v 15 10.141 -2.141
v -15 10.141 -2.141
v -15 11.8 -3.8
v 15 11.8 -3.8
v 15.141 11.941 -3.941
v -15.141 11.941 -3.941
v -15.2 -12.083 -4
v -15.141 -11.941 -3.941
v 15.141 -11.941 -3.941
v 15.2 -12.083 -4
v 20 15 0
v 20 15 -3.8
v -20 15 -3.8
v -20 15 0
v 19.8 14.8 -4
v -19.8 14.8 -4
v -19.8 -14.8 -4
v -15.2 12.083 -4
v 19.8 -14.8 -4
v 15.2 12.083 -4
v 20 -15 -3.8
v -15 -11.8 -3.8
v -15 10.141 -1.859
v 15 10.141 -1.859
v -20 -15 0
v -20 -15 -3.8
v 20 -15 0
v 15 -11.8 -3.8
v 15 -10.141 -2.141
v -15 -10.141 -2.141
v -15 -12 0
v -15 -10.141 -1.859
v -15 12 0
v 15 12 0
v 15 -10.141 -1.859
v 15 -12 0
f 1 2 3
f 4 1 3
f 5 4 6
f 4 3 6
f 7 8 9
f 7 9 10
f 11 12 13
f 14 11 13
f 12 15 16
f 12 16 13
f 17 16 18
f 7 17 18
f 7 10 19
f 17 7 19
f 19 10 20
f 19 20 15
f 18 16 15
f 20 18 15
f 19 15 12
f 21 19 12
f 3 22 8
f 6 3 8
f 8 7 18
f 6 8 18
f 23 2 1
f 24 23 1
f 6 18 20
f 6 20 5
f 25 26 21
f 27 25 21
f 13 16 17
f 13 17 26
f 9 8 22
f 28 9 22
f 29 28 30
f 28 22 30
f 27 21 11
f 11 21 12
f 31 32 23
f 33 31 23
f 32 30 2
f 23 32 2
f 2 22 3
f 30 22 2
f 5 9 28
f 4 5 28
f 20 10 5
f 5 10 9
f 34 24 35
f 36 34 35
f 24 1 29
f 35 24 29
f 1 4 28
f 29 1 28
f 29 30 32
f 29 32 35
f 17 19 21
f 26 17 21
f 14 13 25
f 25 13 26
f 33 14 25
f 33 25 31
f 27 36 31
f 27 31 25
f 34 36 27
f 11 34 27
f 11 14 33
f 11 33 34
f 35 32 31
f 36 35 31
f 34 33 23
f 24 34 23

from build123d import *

# Parameters (mm, degrees)
F0_W         = 40
F0_H         = 30
F0_W_2       = 30
F0_H_2       = 24
F4_DEPTH     = 30
F5_SIZE      = 0.2
F6_T1_DEPTH  = 31.0286731952
F6_T3_DEPTH  = 41.0286731952
F6_T5_DEPTH  = 30
F6_T10_DEPTH = 25.0286731952
F6_T16_DEPTH = 25.0286731952
F6_T23_DEPTH = 25.0286731952
F6_T27_DEPTH = 30.225714172
F6_T34_DEPTH = 25.0286731952
F6_T38_DEPTH = 30.225714172
F6_T45_DEPTH = 30.225714172
F6_T49_DEPTH = 25.0286731952
F6_T56_DEPTH = 25.0286731952
F6_T60_DEPTH = 30.225714172


# Not quite as in the source:
# - a fillet or chamfer that OpenCascade refuses, or shapes differently, is made with other operations: its cross-section is extruded or revolved along the edge and cut away or added


with BuildPart() as f2:
    # F2: sweep along a path in F1
    with BuildLine(Plane.XZ) as f2_path:
        Line((0, 0), (0, -4))
    # F0 (on Top) → F2 (sweep)
    with BuildSketch(Plane.XY):
        Rectangle(F0_W, F0_H)
        Rectangle(F0_W_2, F0_H_2, mode=Mode.SUBTRACT)
    sweep(path=f2_path.line)

    # F3 (on face) → F4 (join, through all)
    with BuildSketch(Plane.YZ.offset(-15)):
        Polygon((-10, -2), (-12, 0), (-12, -4), align=None)
        Polygon((10, -2), (12, -4), (12, 0), align=None)
    extrude(amount=F4_DEPTH)

    # F5
    f5_edges = [f2.edges().sort_by_distance(p)[0] for p in [
        (0, -10, -2),
        (0, 10, -2),
    ]]
    chamfer(f5_edges, length=F5_SIZE)

    # F6: chamfer of 0.2 on 8 edges, made by hand

    # F6_s2 → F6_t1 (cut)
    with BuildSketch(Plane.XZ.offset(-15.5143365976)):
        Polygon((19.8, -4), (20, -3.8), (20, -4), align=None)
        Polygon((-19.8, -4), (-20, -3.8), (-20, -4), align=None)
    extrude(amount=F6_T1_DEPTH, mode=Mode.SUBTRACT)

    # F6_s4 → F6_t3 (cut)
    with BuildSketch(Plane.YZ.offset(-20.5143365976)):
        Polygon((-14.8, -4), (-15, -3.8), (-15, -4), align=None)
        Polygon((14.8, -4), (15, -3.8), (15, -4), align=None)
    extrude(amount=F6_T3_DEPTH, mode=Mode.SUBTRACT)

    # F6_s6 → F6_t5 (cut)
    with BuildSketch(Plane.YZ.offset(-15)):
        Polygon((-11.9414213562, -3.9414213562), (-12.0828427125, -4), (-12, -4), align=None)
        Polygon((12.0828427125, -4), (11.9414213562, -3.9414213562), (12, -4), align=None)
    extrude(amount=F6_T5_DEPTH, mode=Mode.SUBTRACT)


with BuildPart() as f6_tool8:
    # F6_s9 → F6_t10 (new body)
    with BuildSketch(Plane.XZ.offset(12.5143365976)):
        Polygon((-15, -3.8), (-15.2, -4), (-15, -4), align=None)
    extrude(amount=-F6_T10_DEPTH)

    split(bisect_by=Plane(origin=(0, -4, 4), x_dir=(1, 0, 0), z_dir=(0, 0.7071067812, -0.7071067812)), keep=Keep.TOP)

    split(bisect_by=Plane(origin=(0, 4, 4), x_dir=(1, 0, 0), z_dir=(0, -0.7071067812, -0.7071067812)), keep=Keep.TOP)


with BuildPart() as f2_1:
    add(f2.part)

    # F6_t7: cut F6_tool8
    add(f6_tool8.part, mode=Mode.SUBTRACT)


with BuildPart() as f6_tool14:
    # F6_s15 → F6_t16 (new body)
    with BuildSketch(Plane.XZ.offset(-12.5143365976)):
        Polygon((15.2, -4), (15, -3.8), (15, -4), align=None)
    extrude(amount=F6_T16_DEPTH)

    split(bisect_by=Plane(origin=(0, -4, 4), x_dir=(1, 0, 0), z_dir=(0, 0.7071067812, -0.7071067812)), keep=Keep.TOP)

    split(bisect_by=Plane(origin=(0, 4, 4), x_dir=(1, 0, 0), z_dir=(0, -0.7071067812, -0.7071067812)), keep=Keep.TOP)


with BuildPart() as f2_2:
    add(f2_1.part)

    # F6_t13: cut F6_tool14
    add(f6_tool14.part, mode=Mode.SUBTRACT)


with BuildPart() as f6_tool21:
    # F6_s22 → F6_t23 (new body)
    with BuildSketch(Plane.XZ.offset(12.5143365976)):
        Polygon((-15, -3.8), (-15.2, -4), (-15, -4), align=None)
    extrude(amount=-F6_T23_DEPTH)

    split(bisect_by=Plane(origin=(0, -4, 4), x_dir=(1, 0, 0), z_dir=(0, -0.7071067812, 0.7071067812)), keep=Keep.TOP)


with BuildPart() as f6_tool25:
    # F6_s26 → F6_t27 (new body)
    with BuildSketch(Plane.YZ.offset(15)):
        Polygon((-11.9414213562, -3.9414213562), (-12.0828427125, -4), (-12, -4), align=None)
    extrude(amount=-F6_T27_DEPTH)

    split(bisect_by=Plane.YZ.offset(-15), keep=Keep.BOTTOM)


with BuildPart() as f6_tool21_1:
    add(f6_tool21.part)

    # F6_t29: intersect F6_tool25
    add(f6_tool25.part, mode=Mode.INTERSECT)


with BuildPart() as f2_3:
    add(f2_2.part)

    # F6_t19: cut F6_tool21
    add(f6_tool21_1.part, mode=Mode.SUBTRACT)


with BuildPart() as f6_tool32:
    # F6_s33 → F6_t34 (new body)
    with BuildSketch(Plane.XZ.offset(12.5143365976)):
        Polygon((-15, -3.8), (-15.2, -4), (-15, -4), align=None)
    extrude(amount=-F6_T34_DEPTH)

    split(bisect_by=Plane(origin=(0, 4, 4), x_dir=(1, 0, 0), z_dir=(0, 0.7071067812, 0.7071067812)), keep=Keep.TOP)


with BuildPart() as f6_tool36:
    # F6_s37 → F6_t38 (new body)
    with BuildSketch(Plane.YZ.offset(-15.225714172)):
        Polygon((12.0828427125, -4), (11.9414213562, -3.9414213562), (12, -4), align=None)
    extrude(amount=F6_T38_DEPTH)

    split(bisect_by=Plane.YZ.offset(-15), keep=Keep.BOTTOM)


with BuildPart() as f6_tool32_1:
    add(f6_tool32.part)

    # F6_t40: intersect F6_tool36
    add(f6_tool36.part, mode=Mode.INTERSECT)


with BuildPart() as f2_4:
    add(f2_3.part)

    # F6_t30: cut F6_tool32
    add(f6_tool32_1.part, mode=Mode.SUBTRACT)


with BuildPart() as f6_tool43:
    # F6_s44 → F6_t45 (new body)
    with BuildSketch(Plane.YZ.offset(15.225714172)):
        Polygon((-11.9414213562, -3.9414213562), (-12.0828427125, -4), (-12, -4), align=None)
    extrude(amount=-F6_T45_DEPTH)

    split(bisect_by=Plane.YZ.offset(15), keep=Keep.TOP)


with BuildPart() as f6_tool47:
    # F6_s48 → F6_t49 (new body)
    with BuildSketch(Plane.XZ.offset(-12.5143365976)):
        Polygon((15.2, -4), (15, -3.8), (15, -4), align=None)
    extrude(amount=F6_T49_DEPTH)

    split(bisect_by=Plane(origin=(0, -4, 4), x_dir=(1, 0, 0), z_dir=(0, -0.7071067812, 0.7071067812)), keep=Keep.TOP)


with BuildPart() as f6_tool43_1:
    add(f6_tool43.part)

    # F6_t51: intersect F6_tool47
    add(f6_tool47.part, mode=Mode.INTERSECT)


with BuildPart() as f2_5:
    add(f2_4.part)

    # F6_t41: cut F6_tool43
    add(f6_tool43_1.part, mode=Mode.SUBTRACT)


with BuildPart() as f6_tool54:
    # F6_s55 → F6_t56 (new body)
    with BuildSketch(Plane.XZ.offset(-12.5143365976)):
        Polygon((15.2, -4), (15, -3.8), (15, -4), align=None)
    extrude(amount=F6_T56_DEPTH)

    split(bisect_by=Plane(origin=(0, 4, 4), x_dir=(1, 0, 0), z_dir=(0, 0.7071067812, 0.7071067812)), keep=Keep.TOP)


with BuildPart() as f6_tool58:
    # F6_s59 → F6_t60 (new body)
    with BuildSketch(Plane.YZ.offset(-15)):
        Polygon((12.0828427125, -4), (11.9414213562, -3.9414213562), (12, -4), align=None)
    extrude(amount=F6_T60_DEPTH)

    split(bisect_by=Plane.YZ.offset(15), keep=Keep.TOP)


with BuildPart() as f6_tool54_1:
    add(f6_tool54.part)

    # F6_t62: intersect F6_tool58
    add(f6_tool58.part, mode=Mode.INTERSECT)


with BuildPart() as f2_6:
    add(f2_5.part)

    # F6_t52: cut F6_tool54
    add(f6_tool54_1.part, mode=Mode.SUBTRACT)


solid = f2_6.part
